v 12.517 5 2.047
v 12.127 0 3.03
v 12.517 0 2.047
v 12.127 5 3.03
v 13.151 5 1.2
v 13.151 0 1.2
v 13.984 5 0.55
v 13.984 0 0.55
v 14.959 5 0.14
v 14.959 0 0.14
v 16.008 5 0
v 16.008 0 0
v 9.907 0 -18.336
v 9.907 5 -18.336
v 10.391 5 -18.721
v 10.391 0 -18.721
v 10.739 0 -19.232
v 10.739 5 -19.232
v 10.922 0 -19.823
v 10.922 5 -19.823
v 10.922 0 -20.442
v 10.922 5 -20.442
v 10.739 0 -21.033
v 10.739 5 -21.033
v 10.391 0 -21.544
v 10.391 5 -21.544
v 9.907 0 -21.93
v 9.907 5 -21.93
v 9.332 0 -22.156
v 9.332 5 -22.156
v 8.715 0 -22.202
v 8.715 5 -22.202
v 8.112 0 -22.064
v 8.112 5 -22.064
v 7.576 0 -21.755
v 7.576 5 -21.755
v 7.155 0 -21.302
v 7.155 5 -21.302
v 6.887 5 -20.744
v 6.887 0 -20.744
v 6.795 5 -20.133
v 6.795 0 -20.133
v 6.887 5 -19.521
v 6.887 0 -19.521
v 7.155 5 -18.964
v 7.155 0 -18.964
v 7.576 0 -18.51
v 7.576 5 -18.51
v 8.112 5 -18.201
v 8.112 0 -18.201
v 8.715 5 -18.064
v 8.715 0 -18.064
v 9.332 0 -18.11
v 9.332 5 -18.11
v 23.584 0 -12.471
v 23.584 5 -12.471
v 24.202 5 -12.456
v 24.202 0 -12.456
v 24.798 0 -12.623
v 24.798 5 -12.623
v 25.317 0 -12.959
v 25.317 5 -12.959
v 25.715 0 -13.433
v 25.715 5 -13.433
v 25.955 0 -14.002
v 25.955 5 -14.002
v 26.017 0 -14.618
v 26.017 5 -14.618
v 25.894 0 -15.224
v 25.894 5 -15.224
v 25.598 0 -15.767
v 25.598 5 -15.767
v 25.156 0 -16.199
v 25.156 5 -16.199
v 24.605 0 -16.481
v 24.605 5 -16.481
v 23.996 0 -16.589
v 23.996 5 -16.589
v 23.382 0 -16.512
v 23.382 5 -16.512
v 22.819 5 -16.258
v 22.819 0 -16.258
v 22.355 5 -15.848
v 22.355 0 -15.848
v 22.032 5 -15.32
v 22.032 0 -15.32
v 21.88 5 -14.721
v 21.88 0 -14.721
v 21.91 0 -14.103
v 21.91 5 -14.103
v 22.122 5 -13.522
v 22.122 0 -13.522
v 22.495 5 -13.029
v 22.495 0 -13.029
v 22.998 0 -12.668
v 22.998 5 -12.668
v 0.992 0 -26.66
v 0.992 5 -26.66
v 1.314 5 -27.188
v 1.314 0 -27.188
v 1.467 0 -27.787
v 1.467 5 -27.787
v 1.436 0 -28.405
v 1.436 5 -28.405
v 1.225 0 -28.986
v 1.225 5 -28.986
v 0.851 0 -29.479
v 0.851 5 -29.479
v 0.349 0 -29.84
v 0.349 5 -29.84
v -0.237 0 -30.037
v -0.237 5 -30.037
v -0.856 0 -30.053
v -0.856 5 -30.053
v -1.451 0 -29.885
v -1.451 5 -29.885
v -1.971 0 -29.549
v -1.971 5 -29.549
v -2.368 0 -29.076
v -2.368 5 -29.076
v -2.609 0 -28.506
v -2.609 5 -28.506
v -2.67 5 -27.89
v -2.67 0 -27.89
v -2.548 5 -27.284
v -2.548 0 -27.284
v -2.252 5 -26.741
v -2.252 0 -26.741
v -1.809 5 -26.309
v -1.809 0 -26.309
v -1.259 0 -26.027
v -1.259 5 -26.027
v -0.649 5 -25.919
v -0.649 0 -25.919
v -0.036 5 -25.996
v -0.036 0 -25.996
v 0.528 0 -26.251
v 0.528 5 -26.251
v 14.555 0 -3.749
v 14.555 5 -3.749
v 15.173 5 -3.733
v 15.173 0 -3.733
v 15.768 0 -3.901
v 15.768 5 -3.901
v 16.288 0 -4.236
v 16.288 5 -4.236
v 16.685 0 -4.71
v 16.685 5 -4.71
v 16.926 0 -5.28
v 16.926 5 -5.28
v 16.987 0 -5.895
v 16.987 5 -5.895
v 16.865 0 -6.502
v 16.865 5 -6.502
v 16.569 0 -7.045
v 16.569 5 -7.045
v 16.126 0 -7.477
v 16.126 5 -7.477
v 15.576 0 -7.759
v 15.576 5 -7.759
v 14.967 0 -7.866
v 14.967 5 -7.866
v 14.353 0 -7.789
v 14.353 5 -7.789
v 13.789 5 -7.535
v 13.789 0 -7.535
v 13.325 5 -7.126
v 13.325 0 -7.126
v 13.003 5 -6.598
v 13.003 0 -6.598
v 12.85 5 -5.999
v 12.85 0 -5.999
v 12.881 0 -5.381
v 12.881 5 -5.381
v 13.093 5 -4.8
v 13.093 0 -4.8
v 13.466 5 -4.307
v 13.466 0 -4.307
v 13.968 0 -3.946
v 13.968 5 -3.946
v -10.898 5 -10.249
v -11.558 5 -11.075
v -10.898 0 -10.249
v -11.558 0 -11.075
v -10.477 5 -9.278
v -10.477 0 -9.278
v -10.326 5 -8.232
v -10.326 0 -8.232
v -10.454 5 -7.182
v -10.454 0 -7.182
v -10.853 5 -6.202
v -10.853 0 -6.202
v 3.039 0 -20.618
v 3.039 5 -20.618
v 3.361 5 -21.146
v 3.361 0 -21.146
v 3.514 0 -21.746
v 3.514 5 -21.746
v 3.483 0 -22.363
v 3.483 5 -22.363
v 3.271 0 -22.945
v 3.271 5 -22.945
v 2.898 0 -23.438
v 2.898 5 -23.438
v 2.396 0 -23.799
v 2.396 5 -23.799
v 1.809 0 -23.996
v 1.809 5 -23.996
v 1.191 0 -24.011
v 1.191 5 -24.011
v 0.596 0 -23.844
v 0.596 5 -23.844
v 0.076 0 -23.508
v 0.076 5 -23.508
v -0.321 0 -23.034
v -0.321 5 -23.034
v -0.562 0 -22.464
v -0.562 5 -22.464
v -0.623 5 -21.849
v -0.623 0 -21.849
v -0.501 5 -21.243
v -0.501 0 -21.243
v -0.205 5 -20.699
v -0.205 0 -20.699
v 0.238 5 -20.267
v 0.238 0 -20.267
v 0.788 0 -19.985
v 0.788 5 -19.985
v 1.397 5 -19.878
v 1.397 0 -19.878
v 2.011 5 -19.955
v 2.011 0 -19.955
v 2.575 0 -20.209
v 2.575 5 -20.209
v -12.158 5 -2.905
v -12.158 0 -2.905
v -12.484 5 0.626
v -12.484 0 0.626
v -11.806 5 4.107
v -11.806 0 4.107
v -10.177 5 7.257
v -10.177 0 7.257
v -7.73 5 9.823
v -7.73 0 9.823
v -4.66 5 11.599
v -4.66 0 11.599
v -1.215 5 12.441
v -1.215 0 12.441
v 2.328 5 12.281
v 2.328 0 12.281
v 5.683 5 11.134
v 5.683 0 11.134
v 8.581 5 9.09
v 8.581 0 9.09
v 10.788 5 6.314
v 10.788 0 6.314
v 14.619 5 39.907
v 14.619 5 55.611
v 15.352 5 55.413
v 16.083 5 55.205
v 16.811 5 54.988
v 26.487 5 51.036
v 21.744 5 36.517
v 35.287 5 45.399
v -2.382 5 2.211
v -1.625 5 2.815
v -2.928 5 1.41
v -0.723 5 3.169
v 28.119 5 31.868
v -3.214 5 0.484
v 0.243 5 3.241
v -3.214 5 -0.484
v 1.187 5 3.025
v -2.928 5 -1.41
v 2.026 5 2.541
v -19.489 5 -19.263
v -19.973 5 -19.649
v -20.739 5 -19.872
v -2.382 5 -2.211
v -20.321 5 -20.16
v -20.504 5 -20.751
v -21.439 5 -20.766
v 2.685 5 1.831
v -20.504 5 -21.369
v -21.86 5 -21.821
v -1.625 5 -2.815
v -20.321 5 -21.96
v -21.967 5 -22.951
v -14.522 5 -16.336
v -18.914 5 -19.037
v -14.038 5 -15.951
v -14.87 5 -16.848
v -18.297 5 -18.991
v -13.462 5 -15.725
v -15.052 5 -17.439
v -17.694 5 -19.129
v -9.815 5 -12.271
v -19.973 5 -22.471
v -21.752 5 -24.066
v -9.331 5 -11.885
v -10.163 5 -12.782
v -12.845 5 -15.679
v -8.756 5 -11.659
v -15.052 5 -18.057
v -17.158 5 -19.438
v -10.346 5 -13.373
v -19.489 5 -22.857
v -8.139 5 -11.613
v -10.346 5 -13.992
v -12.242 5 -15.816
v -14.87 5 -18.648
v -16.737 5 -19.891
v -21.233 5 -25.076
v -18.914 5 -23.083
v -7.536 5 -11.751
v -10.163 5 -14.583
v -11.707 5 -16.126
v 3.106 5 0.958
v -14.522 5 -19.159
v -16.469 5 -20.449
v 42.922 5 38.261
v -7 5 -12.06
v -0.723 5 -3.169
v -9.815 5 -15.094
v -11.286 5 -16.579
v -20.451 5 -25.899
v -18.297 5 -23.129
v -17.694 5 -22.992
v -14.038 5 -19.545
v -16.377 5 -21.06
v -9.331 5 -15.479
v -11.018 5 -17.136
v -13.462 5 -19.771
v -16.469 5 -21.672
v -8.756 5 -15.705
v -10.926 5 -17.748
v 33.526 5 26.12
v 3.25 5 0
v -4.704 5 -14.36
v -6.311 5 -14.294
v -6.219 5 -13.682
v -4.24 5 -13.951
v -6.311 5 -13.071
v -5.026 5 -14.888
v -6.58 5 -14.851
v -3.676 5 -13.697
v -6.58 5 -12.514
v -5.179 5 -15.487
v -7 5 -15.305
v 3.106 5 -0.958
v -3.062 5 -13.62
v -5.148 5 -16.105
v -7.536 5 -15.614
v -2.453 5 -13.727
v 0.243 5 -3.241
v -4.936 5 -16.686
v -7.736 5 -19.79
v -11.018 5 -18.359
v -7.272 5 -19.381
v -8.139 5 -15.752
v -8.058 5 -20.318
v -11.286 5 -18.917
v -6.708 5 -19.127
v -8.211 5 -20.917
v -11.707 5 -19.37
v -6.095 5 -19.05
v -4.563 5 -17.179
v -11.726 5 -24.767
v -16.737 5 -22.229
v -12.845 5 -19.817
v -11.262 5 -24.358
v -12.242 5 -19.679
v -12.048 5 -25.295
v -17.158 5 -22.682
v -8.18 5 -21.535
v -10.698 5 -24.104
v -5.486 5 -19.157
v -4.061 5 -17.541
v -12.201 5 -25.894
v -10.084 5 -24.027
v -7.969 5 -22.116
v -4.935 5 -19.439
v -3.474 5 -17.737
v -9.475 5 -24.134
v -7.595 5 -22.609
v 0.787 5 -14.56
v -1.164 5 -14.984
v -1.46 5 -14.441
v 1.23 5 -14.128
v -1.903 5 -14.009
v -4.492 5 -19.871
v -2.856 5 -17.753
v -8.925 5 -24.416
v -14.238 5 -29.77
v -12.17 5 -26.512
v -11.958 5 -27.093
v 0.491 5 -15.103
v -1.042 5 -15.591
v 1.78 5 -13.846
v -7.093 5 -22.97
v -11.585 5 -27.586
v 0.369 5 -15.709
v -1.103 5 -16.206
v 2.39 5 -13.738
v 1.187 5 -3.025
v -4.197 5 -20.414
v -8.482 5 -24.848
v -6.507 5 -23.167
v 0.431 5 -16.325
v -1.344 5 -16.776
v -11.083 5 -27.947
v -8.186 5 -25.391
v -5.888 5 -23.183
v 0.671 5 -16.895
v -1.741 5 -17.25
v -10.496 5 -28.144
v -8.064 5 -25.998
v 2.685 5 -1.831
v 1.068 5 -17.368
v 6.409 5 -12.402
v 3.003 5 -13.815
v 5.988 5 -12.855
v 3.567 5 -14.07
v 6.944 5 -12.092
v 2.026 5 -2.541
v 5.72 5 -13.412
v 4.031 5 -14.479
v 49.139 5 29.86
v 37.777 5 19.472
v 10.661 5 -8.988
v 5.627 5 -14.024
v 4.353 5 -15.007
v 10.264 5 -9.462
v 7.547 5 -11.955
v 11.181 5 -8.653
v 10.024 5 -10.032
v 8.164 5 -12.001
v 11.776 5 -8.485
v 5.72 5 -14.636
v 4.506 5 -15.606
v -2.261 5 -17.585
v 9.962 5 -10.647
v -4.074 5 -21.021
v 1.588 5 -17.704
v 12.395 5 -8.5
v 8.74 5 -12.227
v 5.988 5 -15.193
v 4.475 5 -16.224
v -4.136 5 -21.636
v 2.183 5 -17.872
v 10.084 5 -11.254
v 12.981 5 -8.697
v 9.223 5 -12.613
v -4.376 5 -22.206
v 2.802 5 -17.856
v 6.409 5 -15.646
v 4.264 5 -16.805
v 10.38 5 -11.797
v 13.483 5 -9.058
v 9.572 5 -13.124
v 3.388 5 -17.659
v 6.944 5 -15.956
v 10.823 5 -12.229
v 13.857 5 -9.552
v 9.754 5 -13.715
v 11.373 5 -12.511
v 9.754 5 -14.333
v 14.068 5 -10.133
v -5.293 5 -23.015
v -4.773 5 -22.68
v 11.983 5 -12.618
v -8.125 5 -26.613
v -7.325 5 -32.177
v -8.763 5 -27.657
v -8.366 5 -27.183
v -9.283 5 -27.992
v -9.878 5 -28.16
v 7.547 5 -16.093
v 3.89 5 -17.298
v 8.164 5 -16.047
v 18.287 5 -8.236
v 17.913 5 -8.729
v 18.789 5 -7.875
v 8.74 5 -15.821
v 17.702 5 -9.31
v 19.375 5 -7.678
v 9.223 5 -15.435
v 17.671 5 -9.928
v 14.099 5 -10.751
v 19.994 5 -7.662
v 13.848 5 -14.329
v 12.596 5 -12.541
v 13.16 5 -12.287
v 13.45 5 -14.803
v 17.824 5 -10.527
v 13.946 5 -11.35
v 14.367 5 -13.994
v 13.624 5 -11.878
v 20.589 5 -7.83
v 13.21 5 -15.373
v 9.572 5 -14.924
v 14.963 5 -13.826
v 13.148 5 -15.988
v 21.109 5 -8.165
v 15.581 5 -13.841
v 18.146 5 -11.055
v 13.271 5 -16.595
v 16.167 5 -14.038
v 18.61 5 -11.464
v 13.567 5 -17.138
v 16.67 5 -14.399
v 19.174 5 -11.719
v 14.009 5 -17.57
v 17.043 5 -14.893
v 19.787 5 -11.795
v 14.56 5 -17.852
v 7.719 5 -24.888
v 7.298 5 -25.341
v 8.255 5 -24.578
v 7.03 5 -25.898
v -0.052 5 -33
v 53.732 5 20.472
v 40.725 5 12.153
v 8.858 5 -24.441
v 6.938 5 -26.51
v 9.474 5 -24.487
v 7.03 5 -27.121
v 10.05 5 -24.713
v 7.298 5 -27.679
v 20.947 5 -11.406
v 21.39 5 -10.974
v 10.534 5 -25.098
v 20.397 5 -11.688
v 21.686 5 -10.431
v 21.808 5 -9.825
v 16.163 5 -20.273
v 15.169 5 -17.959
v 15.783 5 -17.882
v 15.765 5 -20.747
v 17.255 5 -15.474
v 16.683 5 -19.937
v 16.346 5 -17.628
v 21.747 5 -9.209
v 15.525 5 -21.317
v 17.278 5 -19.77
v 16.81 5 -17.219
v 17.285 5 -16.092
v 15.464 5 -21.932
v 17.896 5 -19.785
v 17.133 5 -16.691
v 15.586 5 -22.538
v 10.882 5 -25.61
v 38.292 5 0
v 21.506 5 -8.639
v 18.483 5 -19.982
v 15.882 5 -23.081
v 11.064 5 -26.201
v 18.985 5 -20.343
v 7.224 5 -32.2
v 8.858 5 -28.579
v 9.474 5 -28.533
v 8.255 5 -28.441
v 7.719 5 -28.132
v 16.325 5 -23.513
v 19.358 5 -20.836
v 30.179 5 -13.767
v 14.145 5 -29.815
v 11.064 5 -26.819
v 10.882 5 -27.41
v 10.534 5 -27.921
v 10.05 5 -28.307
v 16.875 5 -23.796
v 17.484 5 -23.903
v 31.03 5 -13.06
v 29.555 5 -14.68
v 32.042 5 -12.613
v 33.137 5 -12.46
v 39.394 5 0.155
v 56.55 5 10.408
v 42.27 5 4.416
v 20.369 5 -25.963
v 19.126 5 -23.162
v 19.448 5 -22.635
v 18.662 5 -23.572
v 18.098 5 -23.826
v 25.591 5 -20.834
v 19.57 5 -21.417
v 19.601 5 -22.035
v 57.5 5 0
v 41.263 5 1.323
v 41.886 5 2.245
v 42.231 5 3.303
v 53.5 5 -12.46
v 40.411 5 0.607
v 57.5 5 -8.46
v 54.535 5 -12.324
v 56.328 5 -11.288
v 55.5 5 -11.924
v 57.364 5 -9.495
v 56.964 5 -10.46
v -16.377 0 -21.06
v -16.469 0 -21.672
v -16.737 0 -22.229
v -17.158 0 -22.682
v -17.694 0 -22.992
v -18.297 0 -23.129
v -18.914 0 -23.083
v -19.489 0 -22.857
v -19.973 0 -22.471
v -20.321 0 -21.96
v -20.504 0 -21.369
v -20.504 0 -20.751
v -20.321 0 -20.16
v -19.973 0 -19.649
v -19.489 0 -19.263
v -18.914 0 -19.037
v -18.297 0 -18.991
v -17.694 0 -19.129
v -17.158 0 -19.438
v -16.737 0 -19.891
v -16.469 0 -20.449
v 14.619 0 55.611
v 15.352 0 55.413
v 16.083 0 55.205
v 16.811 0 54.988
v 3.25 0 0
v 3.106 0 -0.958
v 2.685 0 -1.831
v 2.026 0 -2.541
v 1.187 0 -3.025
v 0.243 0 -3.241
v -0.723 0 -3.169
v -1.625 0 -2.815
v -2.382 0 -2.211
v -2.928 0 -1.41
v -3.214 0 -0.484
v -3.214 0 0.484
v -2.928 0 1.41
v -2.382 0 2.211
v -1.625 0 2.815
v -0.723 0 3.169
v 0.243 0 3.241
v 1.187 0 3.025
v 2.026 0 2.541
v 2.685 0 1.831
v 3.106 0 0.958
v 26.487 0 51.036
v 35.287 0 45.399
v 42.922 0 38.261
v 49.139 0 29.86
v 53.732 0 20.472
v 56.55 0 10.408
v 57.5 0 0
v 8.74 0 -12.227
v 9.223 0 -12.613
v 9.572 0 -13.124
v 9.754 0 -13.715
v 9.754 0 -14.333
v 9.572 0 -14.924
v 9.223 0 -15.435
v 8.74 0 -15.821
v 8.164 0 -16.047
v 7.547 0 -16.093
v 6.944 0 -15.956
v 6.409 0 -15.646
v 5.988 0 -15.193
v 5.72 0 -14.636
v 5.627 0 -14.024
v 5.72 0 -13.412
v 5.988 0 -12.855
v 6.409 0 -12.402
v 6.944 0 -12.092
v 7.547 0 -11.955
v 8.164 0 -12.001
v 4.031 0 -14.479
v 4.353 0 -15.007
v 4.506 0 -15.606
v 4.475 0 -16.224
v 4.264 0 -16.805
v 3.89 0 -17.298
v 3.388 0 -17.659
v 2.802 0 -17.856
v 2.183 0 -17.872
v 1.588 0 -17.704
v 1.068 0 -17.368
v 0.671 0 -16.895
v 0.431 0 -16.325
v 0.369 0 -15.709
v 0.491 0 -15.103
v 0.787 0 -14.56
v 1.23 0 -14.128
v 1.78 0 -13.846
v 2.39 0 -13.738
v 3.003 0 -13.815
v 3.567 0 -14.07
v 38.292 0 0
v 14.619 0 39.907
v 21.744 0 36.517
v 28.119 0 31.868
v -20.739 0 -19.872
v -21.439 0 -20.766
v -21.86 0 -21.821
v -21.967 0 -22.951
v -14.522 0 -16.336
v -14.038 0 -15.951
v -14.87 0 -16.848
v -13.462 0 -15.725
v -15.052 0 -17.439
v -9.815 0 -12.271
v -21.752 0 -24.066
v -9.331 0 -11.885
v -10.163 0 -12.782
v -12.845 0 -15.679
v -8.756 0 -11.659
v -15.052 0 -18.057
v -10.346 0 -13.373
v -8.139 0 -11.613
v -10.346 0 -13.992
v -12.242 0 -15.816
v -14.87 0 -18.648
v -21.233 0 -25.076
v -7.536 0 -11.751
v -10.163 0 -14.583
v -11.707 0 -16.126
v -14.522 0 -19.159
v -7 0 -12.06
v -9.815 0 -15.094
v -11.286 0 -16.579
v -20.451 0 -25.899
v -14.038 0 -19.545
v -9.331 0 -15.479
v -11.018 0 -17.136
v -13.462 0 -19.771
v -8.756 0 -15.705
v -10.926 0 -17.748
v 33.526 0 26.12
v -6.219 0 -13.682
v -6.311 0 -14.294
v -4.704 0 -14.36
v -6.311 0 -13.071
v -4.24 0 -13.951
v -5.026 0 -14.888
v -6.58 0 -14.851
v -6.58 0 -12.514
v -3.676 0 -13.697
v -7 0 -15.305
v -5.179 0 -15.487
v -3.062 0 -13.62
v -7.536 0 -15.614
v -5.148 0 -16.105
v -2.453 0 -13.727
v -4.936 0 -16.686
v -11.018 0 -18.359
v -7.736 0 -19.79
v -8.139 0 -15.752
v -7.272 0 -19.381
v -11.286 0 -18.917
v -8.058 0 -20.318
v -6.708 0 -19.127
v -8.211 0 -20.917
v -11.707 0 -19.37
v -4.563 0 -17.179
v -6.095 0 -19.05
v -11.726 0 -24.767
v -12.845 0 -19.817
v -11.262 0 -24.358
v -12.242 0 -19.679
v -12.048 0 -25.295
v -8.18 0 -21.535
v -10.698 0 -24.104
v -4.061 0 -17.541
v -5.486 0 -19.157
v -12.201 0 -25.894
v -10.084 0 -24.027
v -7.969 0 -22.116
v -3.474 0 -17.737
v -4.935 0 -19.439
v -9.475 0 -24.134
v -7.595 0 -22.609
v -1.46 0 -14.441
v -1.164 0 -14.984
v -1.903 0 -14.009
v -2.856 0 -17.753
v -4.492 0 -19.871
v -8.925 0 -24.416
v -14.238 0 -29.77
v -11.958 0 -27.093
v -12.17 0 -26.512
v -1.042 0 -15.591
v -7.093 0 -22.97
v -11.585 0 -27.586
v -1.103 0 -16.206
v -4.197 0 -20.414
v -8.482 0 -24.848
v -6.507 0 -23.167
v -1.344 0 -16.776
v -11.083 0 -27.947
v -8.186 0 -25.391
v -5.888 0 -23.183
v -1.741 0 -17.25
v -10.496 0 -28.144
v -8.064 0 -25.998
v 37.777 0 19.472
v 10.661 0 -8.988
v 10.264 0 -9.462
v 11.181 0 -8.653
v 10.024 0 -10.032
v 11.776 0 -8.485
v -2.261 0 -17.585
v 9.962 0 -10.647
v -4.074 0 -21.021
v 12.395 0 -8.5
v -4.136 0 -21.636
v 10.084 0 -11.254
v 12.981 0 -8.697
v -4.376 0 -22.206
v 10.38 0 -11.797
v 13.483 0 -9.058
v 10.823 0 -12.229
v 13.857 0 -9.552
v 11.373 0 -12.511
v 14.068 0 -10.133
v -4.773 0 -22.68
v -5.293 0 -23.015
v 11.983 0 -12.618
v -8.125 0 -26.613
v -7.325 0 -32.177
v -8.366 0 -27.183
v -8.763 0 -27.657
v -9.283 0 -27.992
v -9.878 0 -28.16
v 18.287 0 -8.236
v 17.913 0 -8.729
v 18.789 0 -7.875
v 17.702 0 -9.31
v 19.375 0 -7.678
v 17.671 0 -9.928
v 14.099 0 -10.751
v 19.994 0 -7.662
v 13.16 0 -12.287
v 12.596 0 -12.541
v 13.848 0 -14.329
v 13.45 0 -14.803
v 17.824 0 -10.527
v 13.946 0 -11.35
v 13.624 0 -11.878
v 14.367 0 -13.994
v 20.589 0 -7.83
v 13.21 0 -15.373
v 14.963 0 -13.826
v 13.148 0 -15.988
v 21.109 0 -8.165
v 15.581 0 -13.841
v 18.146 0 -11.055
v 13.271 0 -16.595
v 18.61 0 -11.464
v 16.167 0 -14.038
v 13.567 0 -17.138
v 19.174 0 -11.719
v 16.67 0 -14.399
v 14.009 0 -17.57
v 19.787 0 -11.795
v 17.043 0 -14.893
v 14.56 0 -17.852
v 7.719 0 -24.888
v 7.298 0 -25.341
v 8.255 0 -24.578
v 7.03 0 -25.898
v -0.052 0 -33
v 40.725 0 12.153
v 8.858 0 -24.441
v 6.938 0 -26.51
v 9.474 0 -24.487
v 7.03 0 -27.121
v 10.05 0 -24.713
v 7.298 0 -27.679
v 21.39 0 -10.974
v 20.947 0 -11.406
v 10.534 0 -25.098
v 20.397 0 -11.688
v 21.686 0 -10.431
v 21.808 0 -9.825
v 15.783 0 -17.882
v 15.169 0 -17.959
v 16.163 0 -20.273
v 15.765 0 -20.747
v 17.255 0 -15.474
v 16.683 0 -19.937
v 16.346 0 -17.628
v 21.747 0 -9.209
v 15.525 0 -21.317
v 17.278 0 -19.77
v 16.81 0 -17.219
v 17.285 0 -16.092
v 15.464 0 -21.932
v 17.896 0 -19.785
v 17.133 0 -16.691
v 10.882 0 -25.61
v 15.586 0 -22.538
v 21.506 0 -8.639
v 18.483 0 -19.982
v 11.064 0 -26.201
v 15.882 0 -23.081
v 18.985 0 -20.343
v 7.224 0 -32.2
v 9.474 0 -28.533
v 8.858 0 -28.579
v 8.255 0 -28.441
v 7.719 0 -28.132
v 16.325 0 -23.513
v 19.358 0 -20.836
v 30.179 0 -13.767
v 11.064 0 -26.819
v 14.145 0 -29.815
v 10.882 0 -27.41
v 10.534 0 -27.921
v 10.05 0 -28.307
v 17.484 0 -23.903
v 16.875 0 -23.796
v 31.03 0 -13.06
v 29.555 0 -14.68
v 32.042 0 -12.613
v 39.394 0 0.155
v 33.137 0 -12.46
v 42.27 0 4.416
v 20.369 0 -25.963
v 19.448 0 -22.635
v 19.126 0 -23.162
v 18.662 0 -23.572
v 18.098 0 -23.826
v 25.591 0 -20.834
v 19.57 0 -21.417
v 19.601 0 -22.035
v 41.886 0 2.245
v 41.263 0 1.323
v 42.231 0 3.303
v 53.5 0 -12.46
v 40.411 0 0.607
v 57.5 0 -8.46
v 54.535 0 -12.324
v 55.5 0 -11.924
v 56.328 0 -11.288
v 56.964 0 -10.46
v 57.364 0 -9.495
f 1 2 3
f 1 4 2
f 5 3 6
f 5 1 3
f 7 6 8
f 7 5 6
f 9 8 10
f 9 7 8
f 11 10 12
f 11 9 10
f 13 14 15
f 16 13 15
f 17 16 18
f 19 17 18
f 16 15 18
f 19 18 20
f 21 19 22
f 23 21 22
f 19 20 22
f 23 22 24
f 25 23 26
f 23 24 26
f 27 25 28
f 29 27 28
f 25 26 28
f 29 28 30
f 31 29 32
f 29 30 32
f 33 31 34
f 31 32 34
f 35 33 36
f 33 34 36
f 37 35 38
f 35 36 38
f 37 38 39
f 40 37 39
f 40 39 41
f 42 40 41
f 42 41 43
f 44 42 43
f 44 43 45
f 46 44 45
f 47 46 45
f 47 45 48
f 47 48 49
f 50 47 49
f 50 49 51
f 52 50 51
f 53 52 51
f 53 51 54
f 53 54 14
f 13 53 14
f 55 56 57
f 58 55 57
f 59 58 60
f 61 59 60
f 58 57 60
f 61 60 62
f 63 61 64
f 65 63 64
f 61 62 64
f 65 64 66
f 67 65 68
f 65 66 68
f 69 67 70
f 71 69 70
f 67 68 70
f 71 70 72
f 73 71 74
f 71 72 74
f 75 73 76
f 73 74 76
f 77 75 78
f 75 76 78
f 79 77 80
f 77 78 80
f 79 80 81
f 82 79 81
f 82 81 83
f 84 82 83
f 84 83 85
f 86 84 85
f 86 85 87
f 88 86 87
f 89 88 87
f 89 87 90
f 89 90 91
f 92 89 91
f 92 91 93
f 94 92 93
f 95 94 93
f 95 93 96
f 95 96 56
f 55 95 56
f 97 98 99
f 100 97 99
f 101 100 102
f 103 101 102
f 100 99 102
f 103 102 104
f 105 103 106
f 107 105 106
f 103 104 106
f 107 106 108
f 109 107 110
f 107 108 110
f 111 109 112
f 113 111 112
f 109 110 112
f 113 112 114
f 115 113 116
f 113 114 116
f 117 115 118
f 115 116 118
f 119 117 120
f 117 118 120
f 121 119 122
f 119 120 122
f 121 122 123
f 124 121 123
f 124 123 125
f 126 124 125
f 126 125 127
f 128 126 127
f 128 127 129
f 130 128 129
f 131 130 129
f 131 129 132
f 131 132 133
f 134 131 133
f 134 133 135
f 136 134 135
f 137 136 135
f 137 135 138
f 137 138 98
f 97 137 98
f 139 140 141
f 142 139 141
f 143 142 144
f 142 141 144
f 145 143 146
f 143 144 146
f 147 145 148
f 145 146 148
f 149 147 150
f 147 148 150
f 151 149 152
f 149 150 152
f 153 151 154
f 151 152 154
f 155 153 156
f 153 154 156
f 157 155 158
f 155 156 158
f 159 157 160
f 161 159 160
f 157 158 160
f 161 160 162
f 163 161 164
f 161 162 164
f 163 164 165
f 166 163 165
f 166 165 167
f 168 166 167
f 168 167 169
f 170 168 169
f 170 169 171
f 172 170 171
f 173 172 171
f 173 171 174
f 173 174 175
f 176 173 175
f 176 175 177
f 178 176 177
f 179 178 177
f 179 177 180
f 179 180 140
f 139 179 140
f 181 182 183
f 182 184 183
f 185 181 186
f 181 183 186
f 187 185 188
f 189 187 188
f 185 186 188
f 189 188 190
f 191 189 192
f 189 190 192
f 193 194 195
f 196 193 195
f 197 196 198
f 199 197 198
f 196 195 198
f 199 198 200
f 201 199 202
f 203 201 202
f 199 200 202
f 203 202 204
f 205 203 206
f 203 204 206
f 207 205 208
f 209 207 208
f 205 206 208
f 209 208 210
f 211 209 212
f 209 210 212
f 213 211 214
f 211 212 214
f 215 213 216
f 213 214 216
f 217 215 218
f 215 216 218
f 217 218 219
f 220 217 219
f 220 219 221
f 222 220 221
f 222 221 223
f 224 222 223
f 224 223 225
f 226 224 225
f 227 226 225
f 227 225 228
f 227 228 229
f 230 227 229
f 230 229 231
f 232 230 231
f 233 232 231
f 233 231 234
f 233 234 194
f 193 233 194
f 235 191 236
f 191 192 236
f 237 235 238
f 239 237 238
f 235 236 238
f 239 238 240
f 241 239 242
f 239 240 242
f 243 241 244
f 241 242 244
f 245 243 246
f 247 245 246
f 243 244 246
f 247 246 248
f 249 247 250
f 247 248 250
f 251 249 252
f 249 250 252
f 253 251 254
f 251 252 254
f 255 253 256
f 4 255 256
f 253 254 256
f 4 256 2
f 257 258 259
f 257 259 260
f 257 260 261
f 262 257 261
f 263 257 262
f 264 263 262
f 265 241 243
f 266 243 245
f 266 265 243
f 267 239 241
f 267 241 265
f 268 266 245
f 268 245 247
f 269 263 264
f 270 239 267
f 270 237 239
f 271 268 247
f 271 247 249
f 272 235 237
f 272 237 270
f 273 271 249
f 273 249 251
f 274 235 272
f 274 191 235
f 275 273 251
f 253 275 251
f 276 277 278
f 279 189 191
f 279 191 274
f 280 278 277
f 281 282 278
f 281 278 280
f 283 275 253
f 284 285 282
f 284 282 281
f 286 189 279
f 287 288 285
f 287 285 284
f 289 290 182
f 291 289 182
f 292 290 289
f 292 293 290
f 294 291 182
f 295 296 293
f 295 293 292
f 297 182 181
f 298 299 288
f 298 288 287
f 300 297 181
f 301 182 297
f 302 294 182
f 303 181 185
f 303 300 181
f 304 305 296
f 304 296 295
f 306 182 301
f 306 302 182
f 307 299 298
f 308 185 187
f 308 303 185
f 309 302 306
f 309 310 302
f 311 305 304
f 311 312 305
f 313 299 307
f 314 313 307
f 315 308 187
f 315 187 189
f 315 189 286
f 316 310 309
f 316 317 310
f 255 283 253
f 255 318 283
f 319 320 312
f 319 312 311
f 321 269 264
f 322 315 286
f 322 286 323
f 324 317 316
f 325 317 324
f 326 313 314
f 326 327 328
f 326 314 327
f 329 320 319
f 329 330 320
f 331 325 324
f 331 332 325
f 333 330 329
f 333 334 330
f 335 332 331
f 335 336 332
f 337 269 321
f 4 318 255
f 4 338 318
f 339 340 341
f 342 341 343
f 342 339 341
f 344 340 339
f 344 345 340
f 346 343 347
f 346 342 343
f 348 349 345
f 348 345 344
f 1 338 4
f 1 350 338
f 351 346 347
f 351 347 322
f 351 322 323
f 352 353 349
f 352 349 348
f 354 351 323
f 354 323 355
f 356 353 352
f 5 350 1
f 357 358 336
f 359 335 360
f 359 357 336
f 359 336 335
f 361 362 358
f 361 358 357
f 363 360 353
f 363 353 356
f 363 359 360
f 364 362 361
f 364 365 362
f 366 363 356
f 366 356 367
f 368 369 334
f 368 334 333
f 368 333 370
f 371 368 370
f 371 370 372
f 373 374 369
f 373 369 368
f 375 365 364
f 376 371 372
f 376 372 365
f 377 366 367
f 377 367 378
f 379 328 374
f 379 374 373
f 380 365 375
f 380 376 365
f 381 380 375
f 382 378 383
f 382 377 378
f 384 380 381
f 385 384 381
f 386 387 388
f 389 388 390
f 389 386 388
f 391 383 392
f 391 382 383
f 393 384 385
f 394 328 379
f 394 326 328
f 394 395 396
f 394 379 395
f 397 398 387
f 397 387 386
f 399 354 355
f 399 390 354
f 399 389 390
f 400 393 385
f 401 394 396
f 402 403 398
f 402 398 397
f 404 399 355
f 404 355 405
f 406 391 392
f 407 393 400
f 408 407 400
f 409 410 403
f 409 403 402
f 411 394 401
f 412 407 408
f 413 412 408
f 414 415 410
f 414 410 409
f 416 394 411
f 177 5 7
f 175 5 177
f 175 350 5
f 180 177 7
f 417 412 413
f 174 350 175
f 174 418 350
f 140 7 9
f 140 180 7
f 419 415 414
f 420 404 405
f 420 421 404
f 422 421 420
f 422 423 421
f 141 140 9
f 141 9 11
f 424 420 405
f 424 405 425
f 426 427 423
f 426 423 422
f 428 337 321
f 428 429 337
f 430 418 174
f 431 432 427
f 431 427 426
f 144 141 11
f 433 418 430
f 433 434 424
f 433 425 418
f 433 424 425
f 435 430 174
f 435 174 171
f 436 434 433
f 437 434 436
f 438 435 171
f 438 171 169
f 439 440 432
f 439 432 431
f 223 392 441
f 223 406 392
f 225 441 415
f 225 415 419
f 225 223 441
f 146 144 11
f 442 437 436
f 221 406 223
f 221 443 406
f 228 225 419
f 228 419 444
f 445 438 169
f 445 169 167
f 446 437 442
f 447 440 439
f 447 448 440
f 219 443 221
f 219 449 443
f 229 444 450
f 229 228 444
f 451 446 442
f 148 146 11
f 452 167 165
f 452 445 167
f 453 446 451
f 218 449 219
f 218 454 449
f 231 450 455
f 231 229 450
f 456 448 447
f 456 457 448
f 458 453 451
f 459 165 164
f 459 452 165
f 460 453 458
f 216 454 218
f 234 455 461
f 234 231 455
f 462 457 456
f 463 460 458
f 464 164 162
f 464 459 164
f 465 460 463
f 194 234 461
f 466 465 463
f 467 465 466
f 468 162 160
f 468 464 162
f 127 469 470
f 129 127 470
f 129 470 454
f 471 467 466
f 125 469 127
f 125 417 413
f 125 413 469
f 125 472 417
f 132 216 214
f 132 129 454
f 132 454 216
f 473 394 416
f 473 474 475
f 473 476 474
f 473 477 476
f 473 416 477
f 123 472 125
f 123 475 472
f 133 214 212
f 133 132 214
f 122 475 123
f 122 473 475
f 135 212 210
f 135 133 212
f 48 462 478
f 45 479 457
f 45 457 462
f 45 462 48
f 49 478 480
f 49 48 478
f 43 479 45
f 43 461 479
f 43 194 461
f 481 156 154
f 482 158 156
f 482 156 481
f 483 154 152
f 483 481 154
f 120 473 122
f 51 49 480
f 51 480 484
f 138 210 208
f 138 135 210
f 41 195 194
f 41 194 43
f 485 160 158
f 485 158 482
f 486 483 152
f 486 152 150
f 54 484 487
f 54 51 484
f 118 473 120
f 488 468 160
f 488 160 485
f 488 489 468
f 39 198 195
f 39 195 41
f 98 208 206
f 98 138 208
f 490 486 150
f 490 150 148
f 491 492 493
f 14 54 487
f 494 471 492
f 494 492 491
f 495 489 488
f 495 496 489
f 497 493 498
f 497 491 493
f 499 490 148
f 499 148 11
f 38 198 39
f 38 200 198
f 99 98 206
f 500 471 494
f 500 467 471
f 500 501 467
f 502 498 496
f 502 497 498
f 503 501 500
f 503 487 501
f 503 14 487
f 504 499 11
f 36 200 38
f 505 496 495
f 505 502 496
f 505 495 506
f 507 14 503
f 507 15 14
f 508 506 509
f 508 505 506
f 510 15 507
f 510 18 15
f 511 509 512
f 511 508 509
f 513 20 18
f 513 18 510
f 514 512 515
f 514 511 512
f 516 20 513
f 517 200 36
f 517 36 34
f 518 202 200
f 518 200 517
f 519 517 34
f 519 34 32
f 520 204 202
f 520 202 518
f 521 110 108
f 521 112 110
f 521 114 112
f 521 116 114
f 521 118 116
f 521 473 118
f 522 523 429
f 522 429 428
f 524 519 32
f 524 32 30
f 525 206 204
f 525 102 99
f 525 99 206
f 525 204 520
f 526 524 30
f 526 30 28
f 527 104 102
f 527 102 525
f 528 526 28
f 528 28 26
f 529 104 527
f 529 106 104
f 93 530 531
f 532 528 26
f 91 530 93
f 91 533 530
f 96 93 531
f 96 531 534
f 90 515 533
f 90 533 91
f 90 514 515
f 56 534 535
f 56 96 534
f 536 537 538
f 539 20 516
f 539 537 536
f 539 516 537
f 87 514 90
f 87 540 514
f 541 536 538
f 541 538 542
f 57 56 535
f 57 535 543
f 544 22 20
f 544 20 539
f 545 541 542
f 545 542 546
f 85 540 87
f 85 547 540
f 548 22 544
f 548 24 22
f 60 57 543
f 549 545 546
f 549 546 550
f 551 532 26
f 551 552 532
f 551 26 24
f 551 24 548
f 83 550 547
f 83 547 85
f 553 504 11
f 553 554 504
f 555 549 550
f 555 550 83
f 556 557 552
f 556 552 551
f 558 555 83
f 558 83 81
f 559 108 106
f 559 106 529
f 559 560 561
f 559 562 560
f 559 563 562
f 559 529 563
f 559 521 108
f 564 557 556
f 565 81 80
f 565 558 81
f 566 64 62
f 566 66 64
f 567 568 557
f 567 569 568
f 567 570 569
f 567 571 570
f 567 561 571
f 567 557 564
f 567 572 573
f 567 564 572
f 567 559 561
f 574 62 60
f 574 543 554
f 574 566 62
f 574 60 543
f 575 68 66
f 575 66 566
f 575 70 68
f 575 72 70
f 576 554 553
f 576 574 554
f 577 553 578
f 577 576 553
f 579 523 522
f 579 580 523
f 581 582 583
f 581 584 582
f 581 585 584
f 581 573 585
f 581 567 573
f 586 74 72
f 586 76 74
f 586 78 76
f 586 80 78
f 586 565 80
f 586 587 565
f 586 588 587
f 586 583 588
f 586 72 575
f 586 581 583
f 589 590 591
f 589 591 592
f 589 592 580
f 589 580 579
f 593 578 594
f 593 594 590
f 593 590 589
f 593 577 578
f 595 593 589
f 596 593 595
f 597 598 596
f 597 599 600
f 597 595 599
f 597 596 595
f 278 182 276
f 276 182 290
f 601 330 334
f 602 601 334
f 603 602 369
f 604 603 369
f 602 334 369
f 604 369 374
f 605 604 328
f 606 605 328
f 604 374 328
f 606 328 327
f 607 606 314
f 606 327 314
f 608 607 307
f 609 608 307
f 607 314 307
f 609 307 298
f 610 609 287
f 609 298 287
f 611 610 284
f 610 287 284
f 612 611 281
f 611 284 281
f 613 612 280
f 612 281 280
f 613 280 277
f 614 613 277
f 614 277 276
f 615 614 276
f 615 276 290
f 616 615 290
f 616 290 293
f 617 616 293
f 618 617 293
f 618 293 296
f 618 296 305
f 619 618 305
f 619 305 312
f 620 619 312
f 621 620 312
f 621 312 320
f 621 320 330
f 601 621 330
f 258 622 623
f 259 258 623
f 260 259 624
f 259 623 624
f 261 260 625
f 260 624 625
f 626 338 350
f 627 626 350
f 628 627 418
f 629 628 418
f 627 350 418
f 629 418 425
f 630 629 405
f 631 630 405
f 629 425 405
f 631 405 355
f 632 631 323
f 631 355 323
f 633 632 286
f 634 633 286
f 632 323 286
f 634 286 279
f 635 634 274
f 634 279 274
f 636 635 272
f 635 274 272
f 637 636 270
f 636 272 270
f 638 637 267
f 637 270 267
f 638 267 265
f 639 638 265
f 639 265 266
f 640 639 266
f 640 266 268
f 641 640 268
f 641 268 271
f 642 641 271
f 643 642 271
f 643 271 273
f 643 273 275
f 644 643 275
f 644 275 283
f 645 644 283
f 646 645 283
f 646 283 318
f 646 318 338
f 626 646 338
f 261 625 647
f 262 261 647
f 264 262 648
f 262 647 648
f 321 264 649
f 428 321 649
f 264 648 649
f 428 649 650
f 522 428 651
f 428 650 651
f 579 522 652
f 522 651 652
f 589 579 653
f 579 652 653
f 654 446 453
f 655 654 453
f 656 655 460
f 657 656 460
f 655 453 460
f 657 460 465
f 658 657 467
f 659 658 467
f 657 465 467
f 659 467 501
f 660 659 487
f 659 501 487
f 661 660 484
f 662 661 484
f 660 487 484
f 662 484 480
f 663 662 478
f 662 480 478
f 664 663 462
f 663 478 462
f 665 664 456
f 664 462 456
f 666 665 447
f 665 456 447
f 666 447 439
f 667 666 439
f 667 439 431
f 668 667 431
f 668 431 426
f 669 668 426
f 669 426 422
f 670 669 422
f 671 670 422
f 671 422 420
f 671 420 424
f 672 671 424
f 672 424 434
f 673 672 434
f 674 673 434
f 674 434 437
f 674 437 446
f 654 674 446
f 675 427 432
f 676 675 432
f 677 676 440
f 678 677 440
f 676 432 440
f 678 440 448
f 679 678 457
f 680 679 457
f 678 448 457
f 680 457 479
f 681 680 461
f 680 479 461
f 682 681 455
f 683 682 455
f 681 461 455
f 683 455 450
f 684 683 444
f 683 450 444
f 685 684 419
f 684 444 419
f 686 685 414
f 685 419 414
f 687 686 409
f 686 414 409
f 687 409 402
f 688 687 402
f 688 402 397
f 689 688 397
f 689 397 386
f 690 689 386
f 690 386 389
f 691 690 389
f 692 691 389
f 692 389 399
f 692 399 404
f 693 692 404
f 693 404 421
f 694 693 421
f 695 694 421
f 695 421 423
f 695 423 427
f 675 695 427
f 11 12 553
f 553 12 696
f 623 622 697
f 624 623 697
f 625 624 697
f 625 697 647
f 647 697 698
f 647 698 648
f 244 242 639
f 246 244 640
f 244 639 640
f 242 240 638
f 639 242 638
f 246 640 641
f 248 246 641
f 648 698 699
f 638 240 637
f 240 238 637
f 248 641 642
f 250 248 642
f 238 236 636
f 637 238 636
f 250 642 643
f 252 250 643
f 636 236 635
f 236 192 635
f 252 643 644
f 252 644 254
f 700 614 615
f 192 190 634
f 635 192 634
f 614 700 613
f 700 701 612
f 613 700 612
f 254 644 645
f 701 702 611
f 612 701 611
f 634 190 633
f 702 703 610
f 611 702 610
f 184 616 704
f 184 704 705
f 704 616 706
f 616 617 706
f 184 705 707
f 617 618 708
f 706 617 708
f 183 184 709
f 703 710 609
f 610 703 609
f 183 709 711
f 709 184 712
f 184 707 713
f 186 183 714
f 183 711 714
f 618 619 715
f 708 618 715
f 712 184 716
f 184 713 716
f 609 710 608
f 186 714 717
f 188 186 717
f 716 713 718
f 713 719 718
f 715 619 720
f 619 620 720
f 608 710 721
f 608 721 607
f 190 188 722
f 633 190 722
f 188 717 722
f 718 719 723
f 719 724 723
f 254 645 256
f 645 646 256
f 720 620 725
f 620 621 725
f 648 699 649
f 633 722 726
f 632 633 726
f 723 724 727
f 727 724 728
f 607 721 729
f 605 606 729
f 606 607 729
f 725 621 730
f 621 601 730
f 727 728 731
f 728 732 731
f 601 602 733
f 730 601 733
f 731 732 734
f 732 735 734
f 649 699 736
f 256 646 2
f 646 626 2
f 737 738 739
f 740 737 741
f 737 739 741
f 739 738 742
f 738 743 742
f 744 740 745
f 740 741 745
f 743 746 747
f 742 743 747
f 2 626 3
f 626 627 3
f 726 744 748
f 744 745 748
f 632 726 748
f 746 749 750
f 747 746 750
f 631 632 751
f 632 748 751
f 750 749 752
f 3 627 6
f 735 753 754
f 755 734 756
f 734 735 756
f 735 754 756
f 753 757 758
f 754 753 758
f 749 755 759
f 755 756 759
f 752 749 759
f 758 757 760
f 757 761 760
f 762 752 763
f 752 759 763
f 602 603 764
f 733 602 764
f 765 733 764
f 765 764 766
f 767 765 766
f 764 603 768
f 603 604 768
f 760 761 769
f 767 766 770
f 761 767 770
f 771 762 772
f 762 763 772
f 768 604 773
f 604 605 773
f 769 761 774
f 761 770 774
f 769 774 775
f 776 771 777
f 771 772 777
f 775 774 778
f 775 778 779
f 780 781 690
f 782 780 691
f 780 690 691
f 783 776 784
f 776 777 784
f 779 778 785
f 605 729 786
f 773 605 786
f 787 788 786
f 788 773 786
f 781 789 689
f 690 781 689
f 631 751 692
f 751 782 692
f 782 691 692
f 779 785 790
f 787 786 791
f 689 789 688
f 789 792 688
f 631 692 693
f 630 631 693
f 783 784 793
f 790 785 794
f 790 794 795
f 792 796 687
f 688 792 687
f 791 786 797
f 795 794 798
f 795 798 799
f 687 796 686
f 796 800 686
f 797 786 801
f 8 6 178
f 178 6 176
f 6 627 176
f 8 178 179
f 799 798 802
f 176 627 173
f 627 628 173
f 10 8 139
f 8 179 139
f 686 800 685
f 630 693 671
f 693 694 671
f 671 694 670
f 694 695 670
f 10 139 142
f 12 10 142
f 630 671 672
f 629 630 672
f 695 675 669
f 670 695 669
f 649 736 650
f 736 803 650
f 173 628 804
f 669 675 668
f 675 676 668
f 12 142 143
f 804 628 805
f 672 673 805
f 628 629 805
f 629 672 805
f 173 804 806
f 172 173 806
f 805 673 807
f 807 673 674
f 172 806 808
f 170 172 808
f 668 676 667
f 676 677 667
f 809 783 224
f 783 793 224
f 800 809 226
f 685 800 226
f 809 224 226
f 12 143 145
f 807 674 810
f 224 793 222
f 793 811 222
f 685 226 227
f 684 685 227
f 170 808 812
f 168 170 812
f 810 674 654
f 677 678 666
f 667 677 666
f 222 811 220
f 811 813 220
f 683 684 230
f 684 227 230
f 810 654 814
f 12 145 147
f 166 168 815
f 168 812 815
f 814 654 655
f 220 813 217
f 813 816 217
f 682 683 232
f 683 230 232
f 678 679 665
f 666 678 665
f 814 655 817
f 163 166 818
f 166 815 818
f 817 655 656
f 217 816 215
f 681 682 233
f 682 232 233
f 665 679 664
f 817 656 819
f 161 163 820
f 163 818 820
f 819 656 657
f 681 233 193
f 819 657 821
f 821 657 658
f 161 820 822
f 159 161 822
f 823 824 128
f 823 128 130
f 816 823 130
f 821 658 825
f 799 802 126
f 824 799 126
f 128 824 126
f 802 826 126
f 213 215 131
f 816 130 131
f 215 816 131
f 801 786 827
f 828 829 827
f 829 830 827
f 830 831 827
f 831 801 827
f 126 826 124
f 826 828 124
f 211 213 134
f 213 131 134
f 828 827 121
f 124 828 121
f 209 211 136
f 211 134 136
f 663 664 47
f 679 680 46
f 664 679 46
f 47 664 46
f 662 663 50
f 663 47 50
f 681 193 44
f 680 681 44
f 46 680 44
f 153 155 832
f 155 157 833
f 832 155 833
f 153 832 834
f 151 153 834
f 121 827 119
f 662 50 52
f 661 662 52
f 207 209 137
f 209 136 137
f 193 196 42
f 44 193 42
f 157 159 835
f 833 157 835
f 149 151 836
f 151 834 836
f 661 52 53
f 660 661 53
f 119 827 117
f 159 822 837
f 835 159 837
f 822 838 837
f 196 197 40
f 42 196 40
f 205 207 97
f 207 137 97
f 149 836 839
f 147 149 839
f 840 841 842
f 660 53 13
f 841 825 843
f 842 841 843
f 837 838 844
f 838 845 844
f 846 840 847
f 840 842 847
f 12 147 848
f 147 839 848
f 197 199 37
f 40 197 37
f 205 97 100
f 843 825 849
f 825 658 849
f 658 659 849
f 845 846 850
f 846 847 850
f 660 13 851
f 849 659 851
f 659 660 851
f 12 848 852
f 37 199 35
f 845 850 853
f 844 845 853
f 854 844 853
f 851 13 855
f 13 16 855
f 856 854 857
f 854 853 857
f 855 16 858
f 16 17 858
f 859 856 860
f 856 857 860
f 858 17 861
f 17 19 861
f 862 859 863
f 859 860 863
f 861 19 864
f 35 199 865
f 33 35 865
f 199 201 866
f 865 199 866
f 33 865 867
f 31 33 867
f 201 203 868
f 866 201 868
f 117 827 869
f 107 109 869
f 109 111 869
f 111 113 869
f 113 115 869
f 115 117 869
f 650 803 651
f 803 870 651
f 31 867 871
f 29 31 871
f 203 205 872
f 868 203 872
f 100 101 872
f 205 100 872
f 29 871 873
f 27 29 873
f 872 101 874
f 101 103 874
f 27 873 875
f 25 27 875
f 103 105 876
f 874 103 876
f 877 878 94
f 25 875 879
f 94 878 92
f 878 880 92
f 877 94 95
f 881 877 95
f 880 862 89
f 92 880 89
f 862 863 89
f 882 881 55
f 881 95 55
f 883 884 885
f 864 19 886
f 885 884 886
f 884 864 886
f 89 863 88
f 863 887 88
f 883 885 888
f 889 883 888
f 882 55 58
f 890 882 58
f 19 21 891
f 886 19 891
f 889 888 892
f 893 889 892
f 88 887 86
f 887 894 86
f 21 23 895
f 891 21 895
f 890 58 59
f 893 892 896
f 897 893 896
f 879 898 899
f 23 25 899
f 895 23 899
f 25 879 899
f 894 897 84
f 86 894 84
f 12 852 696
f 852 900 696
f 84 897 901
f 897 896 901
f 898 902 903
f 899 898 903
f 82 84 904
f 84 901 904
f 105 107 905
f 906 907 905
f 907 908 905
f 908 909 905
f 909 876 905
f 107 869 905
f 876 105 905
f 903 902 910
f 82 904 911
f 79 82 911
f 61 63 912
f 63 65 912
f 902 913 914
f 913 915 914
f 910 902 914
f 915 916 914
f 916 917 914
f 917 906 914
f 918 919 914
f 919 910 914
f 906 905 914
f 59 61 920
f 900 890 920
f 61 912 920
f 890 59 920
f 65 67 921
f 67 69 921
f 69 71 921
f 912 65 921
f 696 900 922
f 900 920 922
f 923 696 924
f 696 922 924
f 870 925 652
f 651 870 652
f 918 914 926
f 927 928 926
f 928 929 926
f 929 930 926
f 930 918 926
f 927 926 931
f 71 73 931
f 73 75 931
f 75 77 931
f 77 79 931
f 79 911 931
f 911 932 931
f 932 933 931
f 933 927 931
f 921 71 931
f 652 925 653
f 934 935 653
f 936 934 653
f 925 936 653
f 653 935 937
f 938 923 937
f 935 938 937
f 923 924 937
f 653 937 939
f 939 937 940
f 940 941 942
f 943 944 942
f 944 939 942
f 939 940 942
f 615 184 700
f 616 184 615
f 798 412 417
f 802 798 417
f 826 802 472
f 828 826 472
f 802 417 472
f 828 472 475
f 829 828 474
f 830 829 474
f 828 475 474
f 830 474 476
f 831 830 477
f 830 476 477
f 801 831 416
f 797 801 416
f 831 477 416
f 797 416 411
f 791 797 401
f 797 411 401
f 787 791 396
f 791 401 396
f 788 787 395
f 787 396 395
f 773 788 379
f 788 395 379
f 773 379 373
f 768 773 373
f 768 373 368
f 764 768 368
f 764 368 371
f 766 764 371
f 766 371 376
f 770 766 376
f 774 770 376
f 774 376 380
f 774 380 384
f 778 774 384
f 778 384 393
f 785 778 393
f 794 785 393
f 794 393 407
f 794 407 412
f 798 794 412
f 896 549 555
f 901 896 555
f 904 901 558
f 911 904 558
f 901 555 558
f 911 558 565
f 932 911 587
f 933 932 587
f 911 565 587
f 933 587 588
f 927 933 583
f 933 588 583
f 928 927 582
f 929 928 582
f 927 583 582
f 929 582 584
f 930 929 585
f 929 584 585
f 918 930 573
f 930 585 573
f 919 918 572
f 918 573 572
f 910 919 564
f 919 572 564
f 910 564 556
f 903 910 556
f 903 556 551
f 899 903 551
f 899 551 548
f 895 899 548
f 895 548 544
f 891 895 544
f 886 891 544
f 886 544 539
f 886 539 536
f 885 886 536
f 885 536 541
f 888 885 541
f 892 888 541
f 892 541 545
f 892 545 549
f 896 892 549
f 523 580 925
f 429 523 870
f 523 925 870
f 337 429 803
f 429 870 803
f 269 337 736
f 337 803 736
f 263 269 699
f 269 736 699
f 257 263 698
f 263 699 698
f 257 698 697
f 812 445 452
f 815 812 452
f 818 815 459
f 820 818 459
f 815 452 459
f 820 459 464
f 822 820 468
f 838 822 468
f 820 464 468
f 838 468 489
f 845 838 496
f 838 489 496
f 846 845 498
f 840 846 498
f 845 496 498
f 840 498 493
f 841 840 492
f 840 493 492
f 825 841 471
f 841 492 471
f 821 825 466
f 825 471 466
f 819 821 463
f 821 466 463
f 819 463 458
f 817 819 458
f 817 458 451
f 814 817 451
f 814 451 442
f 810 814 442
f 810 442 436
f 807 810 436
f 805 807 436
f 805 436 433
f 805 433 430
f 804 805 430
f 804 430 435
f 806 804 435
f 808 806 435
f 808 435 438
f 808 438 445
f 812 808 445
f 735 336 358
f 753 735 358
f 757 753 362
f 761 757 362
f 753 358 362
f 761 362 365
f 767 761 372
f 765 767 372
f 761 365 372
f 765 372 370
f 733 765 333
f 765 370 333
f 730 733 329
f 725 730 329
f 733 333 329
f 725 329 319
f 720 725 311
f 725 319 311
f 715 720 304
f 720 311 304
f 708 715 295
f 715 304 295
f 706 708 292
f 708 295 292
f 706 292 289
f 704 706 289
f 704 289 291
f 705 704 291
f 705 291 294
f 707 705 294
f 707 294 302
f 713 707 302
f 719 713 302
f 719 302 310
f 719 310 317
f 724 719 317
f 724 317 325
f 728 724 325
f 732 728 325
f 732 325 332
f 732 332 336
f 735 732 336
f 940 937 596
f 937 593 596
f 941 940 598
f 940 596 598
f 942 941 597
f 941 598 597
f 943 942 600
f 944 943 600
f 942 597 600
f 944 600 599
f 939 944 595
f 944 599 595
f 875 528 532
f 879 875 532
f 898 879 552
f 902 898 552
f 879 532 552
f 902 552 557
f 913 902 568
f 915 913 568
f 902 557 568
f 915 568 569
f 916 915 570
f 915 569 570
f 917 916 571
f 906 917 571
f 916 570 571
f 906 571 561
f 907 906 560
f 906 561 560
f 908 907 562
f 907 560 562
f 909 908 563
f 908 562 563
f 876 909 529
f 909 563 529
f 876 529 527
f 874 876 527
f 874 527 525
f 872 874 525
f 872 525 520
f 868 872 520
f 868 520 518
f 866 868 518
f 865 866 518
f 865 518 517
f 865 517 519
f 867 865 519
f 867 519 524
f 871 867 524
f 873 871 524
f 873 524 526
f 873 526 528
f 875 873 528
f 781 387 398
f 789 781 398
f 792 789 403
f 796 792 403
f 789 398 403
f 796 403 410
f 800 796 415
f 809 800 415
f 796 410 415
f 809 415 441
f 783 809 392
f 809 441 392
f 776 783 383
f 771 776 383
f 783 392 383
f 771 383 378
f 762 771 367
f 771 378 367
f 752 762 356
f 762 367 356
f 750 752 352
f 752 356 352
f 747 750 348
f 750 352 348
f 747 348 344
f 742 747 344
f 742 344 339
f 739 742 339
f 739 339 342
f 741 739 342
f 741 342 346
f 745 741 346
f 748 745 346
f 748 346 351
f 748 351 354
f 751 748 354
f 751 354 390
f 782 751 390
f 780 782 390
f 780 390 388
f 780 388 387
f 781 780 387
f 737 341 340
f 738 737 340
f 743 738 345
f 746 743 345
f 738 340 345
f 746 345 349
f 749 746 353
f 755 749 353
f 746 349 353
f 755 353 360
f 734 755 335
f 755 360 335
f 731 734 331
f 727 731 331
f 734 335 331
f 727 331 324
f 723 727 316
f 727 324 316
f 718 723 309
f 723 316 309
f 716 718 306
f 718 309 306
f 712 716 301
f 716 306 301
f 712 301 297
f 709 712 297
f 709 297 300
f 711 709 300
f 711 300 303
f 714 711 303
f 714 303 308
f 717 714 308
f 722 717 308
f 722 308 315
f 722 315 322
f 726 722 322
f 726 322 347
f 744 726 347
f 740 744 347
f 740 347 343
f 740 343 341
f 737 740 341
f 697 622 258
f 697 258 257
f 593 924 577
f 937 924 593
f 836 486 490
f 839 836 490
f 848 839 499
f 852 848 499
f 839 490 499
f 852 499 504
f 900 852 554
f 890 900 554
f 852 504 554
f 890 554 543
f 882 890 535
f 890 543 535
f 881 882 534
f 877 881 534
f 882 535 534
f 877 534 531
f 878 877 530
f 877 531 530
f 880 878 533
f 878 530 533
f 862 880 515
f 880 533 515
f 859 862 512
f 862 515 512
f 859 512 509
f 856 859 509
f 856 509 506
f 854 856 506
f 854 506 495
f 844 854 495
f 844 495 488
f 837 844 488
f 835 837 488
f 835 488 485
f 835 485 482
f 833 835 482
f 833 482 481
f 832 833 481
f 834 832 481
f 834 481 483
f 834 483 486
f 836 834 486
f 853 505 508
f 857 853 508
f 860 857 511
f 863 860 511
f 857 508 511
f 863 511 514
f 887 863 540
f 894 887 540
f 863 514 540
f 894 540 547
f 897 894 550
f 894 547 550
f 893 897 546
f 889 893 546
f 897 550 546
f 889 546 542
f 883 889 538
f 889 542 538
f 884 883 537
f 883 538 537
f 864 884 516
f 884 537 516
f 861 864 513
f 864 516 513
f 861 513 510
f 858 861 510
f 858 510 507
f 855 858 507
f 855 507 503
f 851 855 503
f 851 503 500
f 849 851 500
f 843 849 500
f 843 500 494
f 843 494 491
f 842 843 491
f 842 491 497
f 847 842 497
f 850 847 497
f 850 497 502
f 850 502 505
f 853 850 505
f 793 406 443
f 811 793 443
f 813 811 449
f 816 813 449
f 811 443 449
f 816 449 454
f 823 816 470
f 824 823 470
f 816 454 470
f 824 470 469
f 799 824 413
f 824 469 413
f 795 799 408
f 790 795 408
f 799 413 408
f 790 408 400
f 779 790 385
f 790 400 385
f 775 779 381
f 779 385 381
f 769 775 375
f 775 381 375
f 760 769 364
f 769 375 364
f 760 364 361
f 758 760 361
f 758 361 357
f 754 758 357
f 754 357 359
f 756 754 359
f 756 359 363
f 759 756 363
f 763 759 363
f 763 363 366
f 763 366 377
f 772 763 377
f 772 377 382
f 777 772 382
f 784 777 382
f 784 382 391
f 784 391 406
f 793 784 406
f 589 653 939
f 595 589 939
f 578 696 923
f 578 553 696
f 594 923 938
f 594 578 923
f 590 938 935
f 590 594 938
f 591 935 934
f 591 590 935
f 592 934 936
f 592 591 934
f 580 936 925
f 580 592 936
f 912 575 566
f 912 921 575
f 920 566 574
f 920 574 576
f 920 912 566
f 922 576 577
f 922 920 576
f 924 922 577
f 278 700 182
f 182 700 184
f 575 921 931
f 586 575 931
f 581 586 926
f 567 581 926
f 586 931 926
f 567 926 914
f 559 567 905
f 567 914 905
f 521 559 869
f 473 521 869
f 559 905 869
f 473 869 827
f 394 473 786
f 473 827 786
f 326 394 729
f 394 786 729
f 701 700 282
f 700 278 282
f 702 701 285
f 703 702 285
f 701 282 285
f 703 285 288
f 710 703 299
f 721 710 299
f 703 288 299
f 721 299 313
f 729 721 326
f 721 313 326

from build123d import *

# Parameters (mm, degrees)
SKETCH1_R               = 12.5
BOSS_EXTRUDE1_DEPTH     = 5
EXTRUDE_THIN1_DEPTH     = 5
SKETCH6_W               = 56.5
SKETCH6_H               = 12.459935794
BOSS_EXTRUDE3_DEPTH     = 5
SKETCH7_R               = 3.25
CUT_EXTRUDE3_DEPTH      = 1
CUT_EXTRUDE3_DEPTH_BACK = 6
BOSS_EXTRUDE4_DEPTH     = 5
SKETCH9_4_W             = 9.626496109
SKETCH9_4_H             = 23.122525611
CUT_EXTRUDE5_DEPTH      = 6
BOSS_EXTRUDE5_DEPTH     = 5
SKETCH11_R              = 2.075
CUT_EXTRUDE6_DEPTH      = 6
SKETCH12_R              = 2.075
CUT_EXTRUDE7_DEPTH      = 6
SKETCH13_R              = 2.075
CUT_EXTRUDE8_DEPTH      = 6
CIRPATTERN1_COUNT       = 6
CIRPATTERN1_ANGLE       = 100
CIRPATTERN2_COUNT       = 6
CIRPATTERN2_ANGLE       = 100
CIRPATTERN3_COUNT       = 6
CIRPATTERN3_ANGLE       = 100
FILLET2_R               = 4


with BuildPart() as part:
    # Sketch1 → Boss-Extrude1 (new body)
    with BuildSketch(Plane(origin=(0, 0, 0), x_dir=(1, 0, 0), z_dir=(0, 1, 0))):
        Circle(SKETCH1_R)
    extrude(amount=BOSS_EXTRUDE1_DEPTH)



with BuildPart() as body_2:
    # Sketch4 → Extrude-Thin1 (new body)
    with BuildSketch(Plane(origin=(0, 0, 0), x_dir=(1, 0, 0), z_dir=(0, 1, 0))):
        with BuildLine():
            ThreePointArc((16.811373022, -54.987523468), (46.221769485, -34.202310238), (57.5, 0))
            Line((57.5, 0), (42.5, 0))
            ThreePointArc((42.5, 0), (34.163916576, -25.279968437), (12.425797451, -40.642952128))
            Line((12.425797451, -40.642952128), (16.811373022, -54.987523468))
        make_face()
    extrude(amount=EXTRUDE_THIN1_DEPTH)


with BuildPart() as part_1:
    add(part.part)

    add(body_2.part)  # Boss-Extrude3 merges body 2
    # Sketch6 → Boss-Extrude3 (add)
    with BuildSketch(Plane(origin=(0, 0, 0), x_dir=(1, 0, 0), z_dir=(0, 1, 0))):
        with Locations((29.25, 6.229967897)):
            Rectangle(SKETCH6_W, SKETCH6_H)
    extrude(amount=BOSS_EXTRUDE3_DEPTH)

    # Sketch7 → Cut-Extrude3 (cut, two sides)
    with BuildSketch(Plane(origin=(0, 5, 0), x_dir=(1, 0, 0), z_dir=(0, 1, 0))) as cut_extrude3_sk:
        Circle(SKETCH7_R)
    extrude(amount=CUT_EXTRUDE3_DEPTH, mode=Mode.SUBTRACT)
    extrude(cut_extrude3_sk.sketch, amount=-CUT_EXTRUDE3_DEPTH_BACK, mode=Mode.SUBTRACT)

    # Sketch9 → Boss-Extrude4 (add)
    with BuildSketch(Plane(origin=(0, 0, 0), x_dir=(1, 0, 0), z_dir=(0, 1, 0))):
        with BuildLine():
            Line((16.811373022, -54.987523468), (14.618585236, -47.815237798))
            Line((14.618585236, -47.815237798), (14.618585236, -55.610673128))
            ThreePointArc((14.618585236, -55.610673128), (15.718067562, -55.309966119), (16.811373022, -54.987523468))
        make_face()
        with BuildLine():
            Line((14.618585236, -47.815237798), (12.425797451, -40.642952128))
            Line((12.425797451, -40.642952128), (11.862973877, -56.262952738))
            ThreePointArc((11.862973877, -56.262952738), (13.244795598, -55.953779046), (14.618585236, -55.610673128))
            Line((14.618585236, -55.610673128), (14.618585236, -47.815237798))
        make_face()
    extrude(amount=BOSS_EXTRUDE4_DEPTH)

    # Sketch9<4> → Cut-Extrude5 (cut, through all)
    with BuildSketch(Plane(origin=(0, 0, 0), x_dir=(1, 0, 0), z_dir=(0, 1, 0))):
        with Locations((9.805337182, -49.150976699)):
            Rectangle(SKETCH9_4_W, SKETCH9_4_H)
    extrude(amount=CUT_EXTRUDE5_DEPTH, mode=Mode.SUBTRACT)

    # Sketch10 → Boss-Extrude5 (add)
    with BuildSketch(Plane(origin=(0, 0, 0), x_dir=(1, 0, 0), z_dir=(0, 1, 0))):
        with BuildLine():
            Line((-23.827361095, 22.831050419), (-5.931209267, 5.683203326))
            Line((-5.931209267, 5.683203326), (19.532104398, 5.683203326))
            Line((19.532104398, 5.683203326), (31.685950206, 9.219574804))
            ThreePointArc((31.685950206, 9.219574804), (7.85858911, 32.050625223), (-23.827361095, 22.831050419))
        make_face()
    extrude(amount=BOSS_EXTRUDE5_DEPTH)

    # Sketch11 → Cut-Extrude6 (cut, through all)
    with BuildSketch(Plane(origin=(0, 5, 0), x_dir=(1, 0, 0), z_dir=(0, 1, 0))):
        with Locations((-8.29398923, 13.682461133)):
            Circle(SKETCH11_R)
    cut_extrude6 = extrude(amount=-CUT_EXTRUDE6_DEPTH, mode=Mode.SUBTRACT)

    # Sketch12 → Cut-Extrude7 (cut, through all)
    with BuildSketch(Plane(origin=(0, 5, 0), x_dir=(1, 0, 0), z_dir=(0, 1, 0))):
        with Locations((-13.000533094, 17.747848863)):
            Circle(SKETCH12_R)
    cut_extrude7 = extrude(amount=-CUT_EXTRUDE7_DEPTH, mode=Mode.SUBTRACT)

    # Sketch13 → Cut-Extrude8 (cut, through all)
    with BuildSketch(Plane(origin=(0, 5, 0), x_dir=(1, 0, 0), z_dir=(0, 1, 0))):
        with Locations((-18.451858843, 21.060125955)):
            Circle(SKETCH13_R)
    cut_extrude8 = extrude(amount=-CUT_EXTRUDE8_DEPTH, mode=Mode.SUBTRACT)

    # CirPattern1: Cut-Extrude6 ×6 about axis
    cirpattern1_axis = Axis((0, 0, 0), (0, -1, 0))
    for i in range(1, CIRPATTERN1_COUNT):
        add(cut_extrude6.rotate(cirpattern1_axis, i * CIRPATTERN1_ANGLE / (CIRPATTERN1_COUNT - 1)), mode=Mode.SUBTRACT)

    # CirPattern2: Cut-Extrude7 ×6 about axis
    cirpattern2_axis = Axis((0, 0, 0), (0, -1, 0))
    for i in range(1, CIRPATTERN2_COUNT):
        add(cut_extrude7.rotate(cirpattern2_axis, i * CIRPATTERN2_ANGLE / (CIRPATTERN2_COUNT - 1)), mode=Mode.SUBTRACT)

    # CirPattern3: Cut-Extrude8 ×6 about axis
    cirpattern3_axis = Axis((0, 0, 0), (0, -1, 0))
    for i in range(1, CIRPATTERN3_COUNT):
        add(cut_extrude8.rotate(cirpattern3_axis, i * CIRPATTERN3_ANGLE / (CIRPATTERN3_COUNT - 1)), mode=Mode.SUBTRACT)

    # Fillet2
    fillet2_edges = [part_1.edges().sort_by_distance(p)[0] for p in [
        (42.5, 2.5, 0),
        (30.557323181, 2.5, -12.459935794),
        (-9.025515566, 2.5, -8.648125159),
        (-23.827361095, 2.5, -22.831050419),
        (12.5, 2.5, 0),
        (57.5, 2.5, -12.459935794),
    ]]
    fillet(fillet2_edges, radius=FILLET2_R)


solid = part_1.part
